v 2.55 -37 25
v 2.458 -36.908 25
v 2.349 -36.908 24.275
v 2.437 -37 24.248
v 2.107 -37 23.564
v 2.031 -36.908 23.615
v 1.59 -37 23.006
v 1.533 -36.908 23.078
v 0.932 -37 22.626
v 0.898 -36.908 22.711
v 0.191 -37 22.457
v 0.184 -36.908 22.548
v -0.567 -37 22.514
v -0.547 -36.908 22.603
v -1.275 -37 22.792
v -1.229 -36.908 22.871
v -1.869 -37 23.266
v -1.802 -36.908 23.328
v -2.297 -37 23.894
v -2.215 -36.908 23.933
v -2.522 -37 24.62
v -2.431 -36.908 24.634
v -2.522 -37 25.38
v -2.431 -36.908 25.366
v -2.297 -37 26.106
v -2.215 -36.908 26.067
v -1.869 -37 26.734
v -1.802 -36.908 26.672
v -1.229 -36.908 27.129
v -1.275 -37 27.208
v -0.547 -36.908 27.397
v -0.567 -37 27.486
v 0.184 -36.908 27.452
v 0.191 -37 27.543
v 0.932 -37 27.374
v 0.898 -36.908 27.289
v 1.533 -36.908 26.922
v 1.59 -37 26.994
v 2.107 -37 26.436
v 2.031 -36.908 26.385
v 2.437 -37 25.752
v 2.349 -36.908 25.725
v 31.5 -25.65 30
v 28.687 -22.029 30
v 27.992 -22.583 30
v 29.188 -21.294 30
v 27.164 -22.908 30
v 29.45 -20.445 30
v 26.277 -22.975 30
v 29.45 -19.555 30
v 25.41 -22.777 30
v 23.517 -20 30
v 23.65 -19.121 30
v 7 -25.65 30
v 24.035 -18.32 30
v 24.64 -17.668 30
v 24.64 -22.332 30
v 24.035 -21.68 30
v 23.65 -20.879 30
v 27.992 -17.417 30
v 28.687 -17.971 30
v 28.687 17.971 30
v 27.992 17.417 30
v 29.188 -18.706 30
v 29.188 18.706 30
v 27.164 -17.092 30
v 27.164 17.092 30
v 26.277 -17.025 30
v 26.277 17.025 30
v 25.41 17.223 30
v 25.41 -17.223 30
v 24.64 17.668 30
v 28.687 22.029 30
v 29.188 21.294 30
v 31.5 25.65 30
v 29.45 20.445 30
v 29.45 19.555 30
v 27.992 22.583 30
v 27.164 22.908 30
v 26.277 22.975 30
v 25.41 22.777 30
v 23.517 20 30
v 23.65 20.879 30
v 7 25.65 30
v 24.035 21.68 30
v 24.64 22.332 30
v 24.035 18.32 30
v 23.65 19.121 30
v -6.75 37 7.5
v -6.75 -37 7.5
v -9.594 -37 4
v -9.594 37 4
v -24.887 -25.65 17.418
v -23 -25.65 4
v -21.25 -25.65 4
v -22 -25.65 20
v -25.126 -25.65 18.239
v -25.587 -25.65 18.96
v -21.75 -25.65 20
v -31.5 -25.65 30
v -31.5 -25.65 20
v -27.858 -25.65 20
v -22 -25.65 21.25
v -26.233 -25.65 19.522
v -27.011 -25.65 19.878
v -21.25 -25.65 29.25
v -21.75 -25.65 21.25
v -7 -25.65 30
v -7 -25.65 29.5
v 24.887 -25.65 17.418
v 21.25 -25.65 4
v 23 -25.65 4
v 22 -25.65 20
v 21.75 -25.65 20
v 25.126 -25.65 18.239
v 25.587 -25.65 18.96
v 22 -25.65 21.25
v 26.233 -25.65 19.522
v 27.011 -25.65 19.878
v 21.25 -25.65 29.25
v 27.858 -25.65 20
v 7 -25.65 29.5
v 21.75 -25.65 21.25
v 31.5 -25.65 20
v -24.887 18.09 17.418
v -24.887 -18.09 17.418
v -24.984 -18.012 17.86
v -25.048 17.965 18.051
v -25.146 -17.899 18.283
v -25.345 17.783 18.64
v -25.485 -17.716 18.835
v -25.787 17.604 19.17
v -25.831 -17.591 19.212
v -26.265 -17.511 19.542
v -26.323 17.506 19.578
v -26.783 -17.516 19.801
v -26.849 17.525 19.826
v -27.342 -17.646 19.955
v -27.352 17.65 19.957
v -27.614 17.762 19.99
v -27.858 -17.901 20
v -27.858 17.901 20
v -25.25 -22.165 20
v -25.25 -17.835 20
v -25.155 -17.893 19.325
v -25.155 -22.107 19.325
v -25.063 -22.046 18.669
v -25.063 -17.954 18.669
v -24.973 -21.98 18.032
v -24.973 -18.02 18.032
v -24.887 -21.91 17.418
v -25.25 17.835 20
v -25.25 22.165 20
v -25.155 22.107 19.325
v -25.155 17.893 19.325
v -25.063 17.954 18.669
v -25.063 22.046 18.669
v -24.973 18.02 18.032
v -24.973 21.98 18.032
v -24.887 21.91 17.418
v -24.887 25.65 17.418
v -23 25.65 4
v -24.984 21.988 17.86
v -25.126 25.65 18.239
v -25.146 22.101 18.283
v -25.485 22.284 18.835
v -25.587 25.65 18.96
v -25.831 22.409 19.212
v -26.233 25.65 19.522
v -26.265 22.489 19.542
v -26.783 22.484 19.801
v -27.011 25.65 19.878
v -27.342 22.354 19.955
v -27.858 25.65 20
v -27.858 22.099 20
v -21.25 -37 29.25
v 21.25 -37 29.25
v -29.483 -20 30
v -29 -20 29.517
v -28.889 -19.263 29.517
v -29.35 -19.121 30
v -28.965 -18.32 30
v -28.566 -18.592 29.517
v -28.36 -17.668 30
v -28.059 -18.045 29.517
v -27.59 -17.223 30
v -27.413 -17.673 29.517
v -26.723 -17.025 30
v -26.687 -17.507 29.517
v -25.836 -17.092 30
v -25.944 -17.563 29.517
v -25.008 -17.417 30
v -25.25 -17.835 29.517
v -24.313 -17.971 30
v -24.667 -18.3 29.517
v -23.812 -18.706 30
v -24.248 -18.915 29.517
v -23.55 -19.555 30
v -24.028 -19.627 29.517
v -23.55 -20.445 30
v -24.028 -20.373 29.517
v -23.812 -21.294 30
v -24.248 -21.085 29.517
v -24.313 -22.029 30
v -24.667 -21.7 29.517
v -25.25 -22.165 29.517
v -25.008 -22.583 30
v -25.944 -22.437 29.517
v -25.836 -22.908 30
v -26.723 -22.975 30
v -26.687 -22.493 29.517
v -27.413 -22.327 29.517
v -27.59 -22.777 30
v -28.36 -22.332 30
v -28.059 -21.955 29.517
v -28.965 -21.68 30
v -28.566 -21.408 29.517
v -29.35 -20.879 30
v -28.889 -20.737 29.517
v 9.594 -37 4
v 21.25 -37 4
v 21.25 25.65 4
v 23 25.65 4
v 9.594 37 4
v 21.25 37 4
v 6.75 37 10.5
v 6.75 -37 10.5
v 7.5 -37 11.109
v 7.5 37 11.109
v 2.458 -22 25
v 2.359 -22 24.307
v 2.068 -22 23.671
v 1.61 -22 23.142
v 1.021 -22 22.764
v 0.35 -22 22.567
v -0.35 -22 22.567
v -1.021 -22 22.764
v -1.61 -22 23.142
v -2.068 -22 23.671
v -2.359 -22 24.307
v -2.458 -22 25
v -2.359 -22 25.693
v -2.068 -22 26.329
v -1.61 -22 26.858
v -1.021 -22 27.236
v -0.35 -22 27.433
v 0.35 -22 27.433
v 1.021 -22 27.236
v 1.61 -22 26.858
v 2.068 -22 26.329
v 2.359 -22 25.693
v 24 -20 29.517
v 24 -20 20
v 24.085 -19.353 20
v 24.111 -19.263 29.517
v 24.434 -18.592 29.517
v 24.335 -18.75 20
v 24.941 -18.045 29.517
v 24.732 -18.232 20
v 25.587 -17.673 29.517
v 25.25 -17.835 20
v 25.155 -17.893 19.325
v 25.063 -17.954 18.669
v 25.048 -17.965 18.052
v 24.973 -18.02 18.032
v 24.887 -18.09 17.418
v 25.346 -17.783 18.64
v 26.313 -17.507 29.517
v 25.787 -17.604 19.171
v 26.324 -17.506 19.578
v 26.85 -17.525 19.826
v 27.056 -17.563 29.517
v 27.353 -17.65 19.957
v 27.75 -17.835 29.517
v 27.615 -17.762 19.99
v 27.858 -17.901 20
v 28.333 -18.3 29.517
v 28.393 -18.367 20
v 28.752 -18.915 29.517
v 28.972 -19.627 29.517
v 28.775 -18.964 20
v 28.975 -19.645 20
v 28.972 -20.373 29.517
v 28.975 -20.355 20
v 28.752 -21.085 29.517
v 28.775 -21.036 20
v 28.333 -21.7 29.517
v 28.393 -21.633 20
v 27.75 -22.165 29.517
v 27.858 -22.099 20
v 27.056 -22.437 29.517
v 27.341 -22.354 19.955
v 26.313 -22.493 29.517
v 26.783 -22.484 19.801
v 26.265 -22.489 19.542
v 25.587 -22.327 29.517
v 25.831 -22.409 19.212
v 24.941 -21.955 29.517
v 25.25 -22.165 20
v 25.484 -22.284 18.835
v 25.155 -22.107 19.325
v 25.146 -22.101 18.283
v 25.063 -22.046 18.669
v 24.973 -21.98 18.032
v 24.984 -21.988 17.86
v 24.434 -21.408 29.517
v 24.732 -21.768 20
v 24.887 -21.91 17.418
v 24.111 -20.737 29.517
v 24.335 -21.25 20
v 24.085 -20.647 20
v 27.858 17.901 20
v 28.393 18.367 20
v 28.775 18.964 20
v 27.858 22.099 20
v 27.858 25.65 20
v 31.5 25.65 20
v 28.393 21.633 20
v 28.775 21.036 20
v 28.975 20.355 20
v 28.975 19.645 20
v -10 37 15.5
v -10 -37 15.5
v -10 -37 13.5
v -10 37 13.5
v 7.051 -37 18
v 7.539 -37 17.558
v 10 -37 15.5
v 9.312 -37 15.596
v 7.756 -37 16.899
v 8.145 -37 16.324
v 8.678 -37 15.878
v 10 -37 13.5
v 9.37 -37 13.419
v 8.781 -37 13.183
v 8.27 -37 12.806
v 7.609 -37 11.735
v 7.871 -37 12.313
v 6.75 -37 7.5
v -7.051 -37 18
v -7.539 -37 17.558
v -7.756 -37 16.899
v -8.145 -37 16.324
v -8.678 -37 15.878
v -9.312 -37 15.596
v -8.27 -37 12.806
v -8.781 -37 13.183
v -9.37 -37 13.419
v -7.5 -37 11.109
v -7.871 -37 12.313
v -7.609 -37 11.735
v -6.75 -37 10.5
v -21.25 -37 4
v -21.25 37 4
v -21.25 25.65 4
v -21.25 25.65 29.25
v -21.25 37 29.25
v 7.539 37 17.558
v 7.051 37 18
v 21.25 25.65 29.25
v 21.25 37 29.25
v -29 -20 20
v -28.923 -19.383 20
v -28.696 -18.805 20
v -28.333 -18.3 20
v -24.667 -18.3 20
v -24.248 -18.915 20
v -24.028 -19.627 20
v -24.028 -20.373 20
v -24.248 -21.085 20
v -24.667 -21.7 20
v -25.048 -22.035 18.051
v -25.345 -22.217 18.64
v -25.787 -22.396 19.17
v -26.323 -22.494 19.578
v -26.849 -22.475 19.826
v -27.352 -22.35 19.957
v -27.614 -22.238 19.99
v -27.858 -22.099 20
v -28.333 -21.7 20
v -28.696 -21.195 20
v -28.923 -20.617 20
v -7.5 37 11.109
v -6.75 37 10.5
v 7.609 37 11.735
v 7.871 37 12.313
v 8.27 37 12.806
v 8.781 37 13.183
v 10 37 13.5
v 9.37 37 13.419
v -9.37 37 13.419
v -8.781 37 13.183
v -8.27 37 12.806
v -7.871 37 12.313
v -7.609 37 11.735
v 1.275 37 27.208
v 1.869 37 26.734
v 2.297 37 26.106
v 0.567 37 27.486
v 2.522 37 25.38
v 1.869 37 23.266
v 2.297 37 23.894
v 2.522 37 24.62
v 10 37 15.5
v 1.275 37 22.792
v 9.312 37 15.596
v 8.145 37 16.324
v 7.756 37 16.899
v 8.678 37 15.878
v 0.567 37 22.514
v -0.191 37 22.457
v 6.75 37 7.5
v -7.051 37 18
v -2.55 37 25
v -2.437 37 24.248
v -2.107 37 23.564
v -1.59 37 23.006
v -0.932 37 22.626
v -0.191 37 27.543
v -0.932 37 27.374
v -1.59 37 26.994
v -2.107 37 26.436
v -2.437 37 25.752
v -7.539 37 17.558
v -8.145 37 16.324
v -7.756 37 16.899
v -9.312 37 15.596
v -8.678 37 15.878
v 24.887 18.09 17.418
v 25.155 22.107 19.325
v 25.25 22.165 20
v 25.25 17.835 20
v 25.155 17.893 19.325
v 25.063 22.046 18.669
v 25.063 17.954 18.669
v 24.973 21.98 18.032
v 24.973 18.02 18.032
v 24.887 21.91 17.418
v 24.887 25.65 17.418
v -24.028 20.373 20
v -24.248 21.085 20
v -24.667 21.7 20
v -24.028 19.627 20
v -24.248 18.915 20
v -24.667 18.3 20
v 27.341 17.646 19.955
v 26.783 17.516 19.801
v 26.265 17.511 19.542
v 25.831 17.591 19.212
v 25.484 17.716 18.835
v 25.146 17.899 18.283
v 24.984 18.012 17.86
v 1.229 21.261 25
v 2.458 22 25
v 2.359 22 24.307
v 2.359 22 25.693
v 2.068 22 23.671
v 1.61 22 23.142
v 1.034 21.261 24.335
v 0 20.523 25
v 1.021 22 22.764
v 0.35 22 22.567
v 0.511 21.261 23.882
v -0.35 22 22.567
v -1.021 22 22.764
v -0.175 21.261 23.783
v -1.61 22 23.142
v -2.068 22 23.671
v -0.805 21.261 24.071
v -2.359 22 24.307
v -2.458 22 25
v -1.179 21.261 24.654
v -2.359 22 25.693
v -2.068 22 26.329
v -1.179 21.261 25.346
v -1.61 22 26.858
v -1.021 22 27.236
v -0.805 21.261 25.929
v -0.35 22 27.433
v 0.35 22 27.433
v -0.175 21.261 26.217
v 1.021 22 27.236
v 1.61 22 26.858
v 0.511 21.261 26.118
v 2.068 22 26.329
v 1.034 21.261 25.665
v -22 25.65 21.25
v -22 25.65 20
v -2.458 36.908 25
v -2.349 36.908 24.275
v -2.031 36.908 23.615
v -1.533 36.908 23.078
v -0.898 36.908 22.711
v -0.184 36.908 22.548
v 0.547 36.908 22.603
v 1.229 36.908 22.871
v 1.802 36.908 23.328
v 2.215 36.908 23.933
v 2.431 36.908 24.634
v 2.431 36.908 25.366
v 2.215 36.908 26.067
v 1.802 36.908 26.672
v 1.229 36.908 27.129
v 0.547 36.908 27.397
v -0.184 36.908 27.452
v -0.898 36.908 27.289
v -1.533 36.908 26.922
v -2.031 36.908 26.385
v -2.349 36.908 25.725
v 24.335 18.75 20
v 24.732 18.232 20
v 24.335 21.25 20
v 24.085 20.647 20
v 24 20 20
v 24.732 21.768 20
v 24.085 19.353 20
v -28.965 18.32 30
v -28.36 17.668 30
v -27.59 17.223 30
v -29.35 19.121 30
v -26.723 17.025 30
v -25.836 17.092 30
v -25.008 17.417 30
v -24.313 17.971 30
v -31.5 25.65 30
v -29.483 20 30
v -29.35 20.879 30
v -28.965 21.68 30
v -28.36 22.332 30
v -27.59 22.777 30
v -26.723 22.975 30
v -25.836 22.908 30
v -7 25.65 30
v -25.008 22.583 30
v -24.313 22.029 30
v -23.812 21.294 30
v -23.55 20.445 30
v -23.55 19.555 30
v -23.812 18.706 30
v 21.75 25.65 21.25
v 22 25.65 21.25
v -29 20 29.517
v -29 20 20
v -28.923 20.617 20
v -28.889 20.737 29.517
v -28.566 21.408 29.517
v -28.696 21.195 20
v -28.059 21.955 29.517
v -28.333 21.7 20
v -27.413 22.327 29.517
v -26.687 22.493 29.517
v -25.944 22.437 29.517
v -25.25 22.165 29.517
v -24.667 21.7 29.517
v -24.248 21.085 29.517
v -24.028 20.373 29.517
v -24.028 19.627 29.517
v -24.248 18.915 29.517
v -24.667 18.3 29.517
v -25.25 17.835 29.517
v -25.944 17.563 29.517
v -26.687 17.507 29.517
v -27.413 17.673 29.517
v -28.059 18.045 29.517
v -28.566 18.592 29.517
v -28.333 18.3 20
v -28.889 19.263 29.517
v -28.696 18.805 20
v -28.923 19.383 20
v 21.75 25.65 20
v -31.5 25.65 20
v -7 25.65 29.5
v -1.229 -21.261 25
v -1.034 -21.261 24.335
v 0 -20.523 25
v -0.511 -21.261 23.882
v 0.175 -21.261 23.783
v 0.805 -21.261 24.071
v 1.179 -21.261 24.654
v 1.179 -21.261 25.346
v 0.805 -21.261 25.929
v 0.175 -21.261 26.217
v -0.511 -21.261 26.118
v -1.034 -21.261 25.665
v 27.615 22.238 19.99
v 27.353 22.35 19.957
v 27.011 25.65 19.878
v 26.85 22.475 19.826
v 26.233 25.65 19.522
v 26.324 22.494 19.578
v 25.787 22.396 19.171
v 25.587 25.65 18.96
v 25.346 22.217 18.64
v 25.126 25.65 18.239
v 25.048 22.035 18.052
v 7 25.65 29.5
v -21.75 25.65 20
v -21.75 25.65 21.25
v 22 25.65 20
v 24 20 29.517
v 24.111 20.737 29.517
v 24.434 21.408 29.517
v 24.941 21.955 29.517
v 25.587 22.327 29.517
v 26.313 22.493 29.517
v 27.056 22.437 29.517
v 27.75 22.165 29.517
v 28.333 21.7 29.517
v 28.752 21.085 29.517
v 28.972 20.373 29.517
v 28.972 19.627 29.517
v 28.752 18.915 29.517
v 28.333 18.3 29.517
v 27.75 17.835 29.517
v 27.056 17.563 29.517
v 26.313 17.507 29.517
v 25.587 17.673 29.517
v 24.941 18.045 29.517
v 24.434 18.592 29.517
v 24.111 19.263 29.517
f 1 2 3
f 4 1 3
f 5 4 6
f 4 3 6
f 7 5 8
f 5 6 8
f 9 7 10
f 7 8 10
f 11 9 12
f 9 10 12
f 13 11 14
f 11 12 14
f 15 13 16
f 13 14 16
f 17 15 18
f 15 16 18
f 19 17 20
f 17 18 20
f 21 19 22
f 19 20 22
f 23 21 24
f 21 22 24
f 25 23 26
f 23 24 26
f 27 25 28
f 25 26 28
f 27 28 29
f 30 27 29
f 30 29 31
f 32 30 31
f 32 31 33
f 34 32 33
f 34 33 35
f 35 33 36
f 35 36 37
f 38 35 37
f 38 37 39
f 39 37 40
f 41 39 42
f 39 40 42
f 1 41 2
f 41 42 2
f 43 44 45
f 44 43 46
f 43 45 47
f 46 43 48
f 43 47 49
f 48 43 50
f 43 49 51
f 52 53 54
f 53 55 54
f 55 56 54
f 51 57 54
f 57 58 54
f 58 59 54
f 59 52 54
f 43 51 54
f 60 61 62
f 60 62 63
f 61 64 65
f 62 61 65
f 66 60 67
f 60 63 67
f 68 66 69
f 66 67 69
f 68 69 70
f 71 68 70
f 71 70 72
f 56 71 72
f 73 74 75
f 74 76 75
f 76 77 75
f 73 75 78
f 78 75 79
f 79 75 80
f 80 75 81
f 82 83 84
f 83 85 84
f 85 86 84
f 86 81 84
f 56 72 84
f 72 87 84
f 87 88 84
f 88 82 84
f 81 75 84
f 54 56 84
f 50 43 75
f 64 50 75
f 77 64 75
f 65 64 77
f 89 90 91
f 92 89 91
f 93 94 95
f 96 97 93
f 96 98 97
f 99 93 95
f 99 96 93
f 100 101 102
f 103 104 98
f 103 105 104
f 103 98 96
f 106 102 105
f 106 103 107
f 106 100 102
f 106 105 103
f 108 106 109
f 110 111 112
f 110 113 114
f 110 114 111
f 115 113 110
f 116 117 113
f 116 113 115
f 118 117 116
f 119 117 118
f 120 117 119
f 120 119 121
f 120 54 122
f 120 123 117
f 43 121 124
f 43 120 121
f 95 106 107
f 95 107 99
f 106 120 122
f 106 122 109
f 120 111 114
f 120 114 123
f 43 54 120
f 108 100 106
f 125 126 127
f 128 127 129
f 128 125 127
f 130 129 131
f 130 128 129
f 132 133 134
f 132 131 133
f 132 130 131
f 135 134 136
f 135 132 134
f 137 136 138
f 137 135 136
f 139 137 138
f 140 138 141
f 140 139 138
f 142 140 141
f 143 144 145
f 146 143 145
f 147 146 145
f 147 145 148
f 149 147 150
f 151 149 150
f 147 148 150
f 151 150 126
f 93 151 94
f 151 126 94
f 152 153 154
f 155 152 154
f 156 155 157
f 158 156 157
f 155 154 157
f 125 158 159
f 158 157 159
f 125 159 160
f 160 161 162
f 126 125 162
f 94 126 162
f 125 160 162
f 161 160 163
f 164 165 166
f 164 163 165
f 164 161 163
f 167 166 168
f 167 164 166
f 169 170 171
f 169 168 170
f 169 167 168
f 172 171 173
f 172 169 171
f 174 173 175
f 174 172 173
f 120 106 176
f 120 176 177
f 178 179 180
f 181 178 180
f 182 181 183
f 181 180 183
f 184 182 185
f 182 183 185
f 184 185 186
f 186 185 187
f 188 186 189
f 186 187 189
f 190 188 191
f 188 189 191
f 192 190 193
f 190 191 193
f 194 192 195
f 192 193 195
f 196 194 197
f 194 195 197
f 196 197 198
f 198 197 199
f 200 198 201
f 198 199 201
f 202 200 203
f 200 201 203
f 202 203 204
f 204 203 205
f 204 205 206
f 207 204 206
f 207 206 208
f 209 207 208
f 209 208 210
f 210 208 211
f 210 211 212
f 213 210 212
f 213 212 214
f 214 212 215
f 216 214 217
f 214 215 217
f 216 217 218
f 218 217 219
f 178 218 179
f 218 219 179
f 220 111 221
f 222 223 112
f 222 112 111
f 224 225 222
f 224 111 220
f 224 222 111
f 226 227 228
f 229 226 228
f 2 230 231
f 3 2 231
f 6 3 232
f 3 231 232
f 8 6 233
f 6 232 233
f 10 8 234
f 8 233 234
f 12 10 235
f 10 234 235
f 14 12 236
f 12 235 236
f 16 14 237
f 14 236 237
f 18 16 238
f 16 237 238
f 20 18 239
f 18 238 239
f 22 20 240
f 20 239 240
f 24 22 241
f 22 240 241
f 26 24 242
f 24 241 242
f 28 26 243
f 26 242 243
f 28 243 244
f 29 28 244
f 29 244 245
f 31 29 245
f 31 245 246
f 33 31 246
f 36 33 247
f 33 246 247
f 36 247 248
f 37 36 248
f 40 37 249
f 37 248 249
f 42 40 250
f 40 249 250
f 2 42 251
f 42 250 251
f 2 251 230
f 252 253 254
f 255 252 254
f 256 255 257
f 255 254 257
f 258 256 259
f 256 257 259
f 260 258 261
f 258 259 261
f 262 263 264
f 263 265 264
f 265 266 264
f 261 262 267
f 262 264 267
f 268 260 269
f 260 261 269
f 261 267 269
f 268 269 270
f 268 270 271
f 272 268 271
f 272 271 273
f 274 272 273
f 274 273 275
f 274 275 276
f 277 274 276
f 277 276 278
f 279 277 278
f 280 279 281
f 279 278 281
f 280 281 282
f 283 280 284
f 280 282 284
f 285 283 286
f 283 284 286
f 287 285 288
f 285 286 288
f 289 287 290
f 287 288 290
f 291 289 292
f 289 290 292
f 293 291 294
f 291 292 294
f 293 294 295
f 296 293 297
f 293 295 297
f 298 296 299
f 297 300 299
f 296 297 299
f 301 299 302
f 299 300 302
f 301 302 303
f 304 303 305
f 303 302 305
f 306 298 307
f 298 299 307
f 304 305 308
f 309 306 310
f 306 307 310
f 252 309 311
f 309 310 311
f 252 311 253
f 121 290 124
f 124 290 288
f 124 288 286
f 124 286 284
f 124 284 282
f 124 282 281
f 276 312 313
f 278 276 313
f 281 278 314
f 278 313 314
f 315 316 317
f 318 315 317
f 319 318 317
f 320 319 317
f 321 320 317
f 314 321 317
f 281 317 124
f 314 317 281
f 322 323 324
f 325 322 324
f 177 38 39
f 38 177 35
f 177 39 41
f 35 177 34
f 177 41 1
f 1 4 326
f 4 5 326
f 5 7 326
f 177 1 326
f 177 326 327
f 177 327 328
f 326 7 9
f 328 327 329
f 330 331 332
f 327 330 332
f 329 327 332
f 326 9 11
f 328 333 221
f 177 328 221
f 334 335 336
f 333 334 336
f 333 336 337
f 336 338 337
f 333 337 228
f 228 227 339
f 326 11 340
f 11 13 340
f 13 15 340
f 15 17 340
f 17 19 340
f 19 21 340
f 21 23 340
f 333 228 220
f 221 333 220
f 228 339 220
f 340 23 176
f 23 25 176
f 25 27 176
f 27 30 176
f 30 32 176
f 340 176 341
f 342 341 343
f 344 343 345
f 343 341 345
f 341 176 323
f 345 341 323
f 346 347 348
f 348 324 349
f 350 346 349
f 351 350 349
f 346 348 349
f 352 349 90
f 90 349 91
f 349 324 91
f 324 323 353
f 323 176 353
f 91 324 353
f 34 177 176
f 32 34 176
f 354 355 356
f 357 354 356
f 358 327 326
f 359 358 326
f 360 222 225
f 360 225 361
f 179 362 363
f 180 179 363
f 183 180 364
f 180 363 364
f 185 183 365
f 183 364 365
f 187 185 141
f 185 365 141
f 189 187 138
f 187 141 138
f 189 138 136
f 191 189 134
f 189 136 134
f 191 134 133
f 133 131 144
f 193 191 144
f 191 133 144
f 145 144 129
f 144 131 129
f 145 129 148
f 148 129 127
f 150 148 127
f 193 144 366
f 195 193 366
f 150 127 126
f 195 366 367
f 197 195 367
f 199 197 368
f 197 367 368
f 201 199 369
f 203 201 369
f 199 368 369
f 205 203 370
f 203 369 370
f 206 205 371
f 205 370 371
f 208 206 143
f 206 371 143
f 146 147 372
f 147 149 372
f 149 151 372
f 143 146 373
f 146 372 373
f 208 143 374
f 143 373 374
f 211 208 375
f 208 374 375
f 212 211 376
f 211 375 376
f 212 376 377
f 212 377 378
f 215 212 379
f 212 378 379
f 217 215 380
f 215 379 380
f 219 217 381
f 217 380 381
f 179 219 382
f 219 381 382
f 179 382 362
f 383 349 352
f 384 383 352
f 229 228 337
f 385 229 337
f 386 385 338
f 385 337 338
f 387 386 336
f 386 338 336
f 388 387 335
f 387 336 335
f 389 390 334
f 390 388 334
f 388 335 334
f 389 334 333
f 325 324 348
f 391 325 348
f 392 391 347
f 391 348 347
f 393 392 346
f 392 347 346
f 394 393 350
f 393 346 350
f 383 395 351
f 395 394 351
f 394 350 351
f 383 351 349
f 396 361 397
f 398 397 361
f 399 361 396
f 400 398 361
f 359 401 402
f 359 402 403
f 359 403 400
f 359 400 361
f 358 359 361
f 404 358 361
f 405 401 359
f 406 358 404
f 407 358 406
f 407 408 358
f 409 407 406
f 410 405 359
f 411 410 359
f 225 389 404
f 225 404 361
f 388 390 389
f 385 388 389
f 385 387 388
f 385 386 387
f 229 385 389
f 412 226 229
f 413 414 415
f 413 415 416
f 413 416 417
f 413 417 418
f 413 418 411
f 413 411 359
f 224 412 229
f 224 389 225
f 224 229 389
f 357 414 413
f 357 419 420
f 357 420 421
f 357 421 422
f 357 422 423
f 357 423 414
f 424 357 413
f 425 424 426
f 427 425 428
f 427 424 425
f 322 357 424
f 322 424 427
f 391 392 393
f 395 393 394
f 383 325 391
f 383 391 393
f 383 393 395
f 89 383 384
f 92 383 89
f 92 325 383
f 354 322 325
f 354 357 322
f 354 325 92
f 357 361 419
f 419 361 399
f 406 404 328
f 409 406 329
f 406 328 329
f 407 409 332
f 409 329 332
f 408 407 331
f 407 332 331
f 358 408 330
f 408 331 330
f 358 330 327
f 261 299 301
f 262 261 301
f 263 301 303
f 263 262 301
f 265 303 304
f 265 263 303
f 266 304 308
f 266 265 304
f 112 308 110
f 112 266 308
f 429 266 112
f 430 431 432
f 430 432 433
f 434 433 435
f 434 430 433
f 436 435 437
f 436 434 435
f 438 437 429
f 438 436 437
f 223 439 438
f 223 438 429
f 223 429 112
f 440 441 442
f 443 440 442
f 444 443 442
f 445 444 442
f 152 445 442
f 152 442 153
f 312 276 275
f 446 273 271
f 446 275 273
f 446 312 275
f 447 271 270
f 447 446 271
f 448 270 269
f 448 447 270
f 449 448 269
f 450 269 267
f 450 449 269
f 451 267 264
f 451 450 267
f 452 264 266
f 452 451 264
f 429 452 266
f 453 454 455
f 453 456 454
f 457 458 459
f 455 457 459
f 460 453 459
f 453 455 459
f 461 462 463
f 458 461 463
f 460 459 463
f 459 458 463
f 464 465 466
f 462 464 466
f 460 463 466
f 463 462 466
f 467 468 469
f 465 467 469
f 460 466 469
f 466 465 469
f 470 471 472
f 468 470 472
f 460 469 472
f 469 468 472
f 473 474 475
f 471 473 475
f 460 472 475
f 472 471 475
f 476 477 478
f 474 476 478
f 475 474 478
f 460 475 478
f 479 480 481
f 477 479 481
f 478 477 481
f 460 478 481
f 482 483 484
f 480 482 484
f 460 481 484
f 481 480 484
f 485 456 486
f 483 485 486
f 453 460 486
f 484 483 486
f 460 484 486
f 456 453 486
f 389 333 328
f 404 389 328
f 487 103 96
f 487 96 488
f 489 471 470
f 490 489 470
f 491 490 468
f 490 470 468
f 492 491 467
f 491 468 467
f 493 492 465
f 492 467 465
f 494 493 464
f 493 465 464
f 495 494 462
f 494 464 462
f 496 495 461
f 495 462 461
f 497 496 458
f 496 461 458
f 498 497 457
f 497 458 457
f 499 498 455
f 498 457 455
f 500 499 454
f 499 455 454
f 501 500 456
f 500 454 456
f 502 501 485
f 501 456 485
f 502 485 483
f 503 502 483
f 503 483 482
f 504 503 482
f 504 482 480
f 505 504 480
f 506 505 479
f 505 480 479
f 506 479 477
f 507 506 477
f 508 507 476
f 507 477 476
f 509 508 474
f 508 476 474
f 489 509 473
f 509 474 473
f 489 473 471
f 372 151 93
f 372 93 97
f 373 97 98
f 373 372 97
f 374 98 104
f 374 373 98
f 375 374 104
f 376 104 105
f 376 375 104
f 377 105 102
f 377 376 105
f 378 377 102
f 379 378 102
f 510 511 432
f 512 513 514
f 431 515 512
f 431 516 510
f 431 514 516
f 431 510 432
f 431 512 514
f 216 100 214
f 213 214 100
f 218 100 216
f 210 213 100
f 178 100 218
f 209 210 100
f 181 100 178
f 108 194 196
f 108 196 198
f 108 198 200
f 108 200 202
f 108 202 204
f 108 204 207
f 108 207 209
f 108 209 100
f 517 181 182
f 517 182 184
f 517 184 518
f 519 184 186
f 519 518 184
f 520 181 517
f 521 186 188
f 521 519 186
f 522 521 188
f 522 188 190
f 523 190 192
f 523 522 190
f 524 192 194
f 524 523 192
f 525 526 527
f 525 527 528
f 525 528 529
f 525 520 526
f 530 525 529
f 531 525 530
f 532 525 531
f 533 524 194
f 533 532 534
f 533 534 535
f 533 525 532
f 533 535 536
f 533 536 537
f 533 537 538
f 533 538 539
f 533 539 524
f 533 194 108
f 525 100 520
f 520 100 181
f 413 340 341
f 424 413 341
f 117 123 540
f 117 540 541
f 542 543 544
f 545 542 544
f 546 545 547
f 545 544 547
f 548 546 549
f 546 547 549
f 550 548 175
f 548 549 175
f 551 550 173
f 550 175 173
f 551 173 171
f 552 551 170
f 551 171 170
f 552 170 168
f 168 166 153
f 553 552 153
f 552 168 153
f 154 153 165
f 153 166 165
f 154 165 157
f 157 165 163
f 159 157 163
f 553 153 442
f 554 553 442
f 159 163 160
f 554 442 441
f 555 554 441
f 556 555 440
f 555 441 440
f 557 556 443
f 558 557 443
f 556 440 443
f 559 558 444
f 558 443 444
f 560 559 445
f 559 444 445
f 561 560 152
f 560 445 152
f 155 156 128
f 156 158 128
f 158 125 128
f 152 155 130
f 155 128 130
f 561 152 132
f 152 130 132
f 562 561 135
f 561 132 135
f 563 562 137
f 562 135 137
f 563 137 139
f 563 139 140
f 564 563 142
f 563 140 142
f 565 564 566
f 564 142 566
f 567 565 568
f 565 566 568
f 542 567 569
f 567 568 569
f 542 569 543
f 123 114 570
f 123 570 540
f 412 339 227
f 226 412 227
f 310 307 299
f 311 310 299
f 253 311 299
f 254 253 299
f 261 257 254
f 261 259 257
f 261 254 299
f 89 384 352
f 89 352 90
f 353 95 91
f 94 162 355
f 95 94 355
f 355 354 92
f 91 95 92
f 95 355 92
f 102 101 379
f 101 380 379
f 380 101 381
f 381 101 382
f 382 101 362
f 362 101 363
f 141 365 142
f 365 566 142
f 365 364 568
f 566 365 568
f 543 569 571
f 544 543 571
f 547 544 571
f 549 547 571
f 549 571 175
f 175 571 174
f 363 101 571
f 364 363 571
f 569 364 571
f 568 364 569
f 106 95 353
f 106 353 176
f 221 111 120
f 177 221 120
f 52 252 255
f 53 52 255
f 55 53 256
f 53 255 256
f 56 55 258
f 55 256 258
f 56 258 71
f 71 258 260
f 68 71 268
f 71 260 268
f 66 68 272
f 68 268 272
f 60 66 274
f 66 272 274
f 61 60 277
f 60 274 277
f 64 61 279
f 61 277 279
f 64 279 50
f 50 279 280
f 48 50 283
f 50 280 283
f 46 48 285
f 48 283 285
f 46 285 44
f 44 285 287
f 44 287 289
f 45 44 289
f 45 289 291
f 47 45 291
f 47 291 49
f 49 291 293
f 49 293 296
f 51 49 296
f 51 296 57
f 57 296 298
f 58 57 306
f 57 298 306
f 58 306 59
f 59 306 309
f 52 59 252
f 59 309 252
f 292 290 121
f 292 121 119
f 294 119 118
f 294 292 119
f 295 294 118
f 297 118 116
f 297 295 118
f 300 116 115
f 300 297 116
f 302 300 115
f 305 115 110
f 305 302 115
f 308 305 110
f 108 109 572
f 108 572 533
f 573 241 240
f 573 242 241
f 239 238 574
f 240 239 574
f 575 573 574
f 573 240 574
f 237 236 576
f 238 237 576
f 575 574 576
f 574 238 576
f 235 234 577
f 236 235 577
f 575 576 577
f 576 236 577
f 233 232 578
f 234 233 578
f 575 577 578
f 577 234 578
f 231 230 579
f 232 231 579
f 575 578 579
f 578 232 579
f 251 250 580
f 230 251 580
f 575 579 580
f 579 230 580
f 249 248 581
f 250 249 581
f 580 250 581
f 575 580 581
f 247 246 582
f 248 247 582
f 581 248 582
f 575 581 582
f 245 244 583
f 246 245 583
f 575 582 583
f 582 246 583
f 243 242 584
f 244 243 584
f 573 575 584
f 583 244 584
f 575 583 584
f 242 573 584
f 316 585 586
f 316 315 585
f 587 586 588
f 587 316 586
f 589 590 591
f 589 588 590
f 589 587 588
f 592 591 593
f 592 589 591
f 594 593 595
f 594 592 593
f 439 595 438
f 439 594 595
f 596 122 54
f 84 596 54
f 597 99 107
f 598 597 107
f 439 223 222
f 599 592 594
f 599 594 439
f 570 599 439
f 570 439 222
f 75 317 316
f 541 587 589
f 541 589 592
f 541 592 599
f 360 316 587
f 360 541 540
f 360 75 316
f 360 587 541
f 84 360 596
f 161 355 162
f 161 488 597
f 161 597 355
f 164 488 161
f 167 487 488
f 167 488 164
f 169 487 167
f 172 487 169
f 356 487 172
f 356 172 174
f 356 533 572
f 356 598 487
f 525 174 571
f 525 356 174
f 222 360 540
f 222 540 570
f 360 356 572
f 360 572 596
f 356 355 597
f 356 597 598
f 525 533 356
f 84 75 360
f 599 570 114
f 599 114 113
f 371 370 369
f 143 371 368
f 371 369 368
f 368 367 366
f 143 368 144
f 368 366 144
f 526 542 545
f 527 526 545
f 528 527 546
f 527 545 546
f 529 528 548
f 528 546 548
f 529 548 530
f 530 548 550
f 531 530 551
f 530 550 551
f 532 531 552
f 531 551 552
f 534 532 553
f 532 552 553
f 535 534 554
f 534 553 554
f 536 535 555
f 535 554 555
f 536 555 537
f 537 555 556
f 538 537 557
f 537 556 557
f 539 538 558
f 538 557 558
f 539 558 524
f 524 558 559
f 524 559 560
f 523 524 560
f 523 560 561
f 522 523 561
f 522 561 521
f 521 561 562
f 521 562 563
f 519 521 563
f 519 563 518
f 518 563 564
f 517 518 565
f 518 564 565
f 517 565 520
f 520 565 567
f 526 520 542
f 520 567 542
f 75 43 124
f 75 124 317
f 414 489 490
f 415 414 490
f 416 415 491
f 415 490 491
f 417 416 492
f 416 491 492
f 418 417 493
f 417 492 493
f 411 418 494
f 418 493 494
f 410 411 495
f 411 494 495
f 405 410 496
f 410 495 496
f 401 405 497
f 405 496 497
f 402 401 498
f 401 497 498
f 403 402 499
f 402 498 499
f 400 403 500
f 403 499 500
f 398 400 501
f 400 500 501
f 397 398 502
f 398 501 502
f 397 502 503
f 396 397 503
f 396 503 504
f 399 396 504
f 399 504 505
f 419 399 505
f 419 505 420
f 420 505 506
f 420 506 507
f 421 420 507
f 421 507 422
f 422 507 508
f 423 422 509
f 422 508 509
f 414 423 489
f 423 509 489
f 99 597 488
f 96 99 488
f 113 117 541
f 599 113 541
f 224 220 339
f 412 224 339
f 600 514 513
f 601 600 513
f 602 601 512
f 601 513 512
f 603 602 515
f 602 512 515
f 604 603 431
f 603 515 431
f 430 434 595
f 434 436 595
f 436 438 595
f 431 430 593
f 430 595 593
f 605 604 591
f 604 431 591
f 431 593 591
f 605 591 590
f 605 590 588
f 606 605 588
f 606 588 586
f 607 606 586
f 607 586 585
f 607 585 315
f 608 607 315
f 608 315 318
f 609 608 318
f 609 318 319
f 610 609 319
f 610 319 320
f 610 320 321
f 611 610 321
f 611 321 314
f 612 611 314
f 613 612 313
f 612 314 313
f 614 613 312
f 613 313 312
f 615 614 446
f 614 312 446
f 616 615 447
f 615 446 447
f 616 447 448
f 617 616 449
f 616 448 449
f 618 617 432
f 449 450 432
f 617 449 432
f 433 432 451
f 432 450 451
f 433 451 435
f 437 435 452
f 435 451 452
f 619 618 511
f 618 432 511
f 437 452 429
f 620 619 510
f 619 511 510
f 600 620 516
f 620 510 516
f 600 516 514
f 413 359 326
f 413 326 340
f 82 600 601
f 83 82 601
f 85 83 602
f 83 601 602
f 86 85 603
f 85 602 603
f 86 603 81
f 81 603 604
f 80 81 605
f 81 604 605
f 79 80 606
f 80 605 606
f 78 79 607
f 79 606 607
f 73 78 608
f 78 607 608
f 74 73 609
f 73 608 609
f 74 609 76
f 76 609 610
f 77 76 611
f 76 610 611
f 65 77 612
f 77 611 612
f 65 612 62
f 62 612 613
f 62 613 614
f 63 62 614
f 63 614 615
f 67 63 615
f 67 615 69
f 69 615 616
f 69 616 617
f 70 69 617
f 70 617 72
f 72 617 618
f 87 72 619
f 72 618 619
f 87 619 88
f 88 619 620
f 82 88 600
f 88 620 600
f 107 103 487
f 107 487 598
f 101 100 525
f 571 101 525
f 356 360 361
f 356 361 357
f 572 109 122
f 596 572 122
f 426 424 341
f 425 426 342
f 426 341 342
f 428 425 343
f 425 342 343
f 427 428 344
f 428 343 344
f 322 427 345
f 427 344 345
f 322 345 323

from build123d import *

# Parameters (mm, degrees)
SKIZZE1_W                       = 44
SKIZZE1_H                       = 51.3
AUFSATZ_LINEAR_AUSTRAGEN1_DEPTH = 26
SKIZZE2_W                       = 0.25
SKIZZE2_H                       = 17.25
SCHNITT_LINEAR_AUSTRAGEN1_DEPTH = 64.369472146
SKIZZE3_W                       = 14
SKIZZE3_H                       = 0.5
SCHNITT_LINEAR_AUSTRAGEN2_DEPTH = 64.369472146
SKIZZE4_W                       = 0.25
SKIZZE4_H                       = 17.25
SCHNITT_LINEAR_AUSTRAGEN3_DEPTH = 51.3
SKIZZE5_W                       = 42.5
SKIZZE5_H                       = 25.25
AUFSATZ_LINEAR_AUSTRAGEN2_DEPTH = 11.35
SKIZZE6_W                       = 42.5
SKIZZE6_H                       = 25.25
AUFSATZ_LINEAR_AUSTRAGEN3_DEPTH = 11.35
SKIZZE15_W                      = 9.5
SKIZZE15_H                      = 51.3
AUFSATZ_LINEAR_AUSTRAGEN5_DEPTH = 10
SCHNITT_LINEAR_AUSTRAGEN4_DEPTH = 86.838511171
BOHRUNG1_D                      = 4.917
BOHRUNG1_DEPTH                  = 15
BOHRUNG1_TIP                    = 1.477215832
BOHRUNG2_D                      = 4.917
BOHRUNG2_DEPTH                  = 15
BOHRUNG2_TIP                    = 1.477215832
M6_GEWINDEBOHRUNG1_D            = 5
M6_GEWINDEBOHRUNG1_DEPTH        = 17
M6_GEWINDEBOHRUNG1_TIP          = 1.502151548
FASE1_SIZE                      = 0.483
FASE2_SIZE                      = 0.448979592
FASE3_SIZE                      = 0.0915
FASE4_SIZE                      = 0.448979592
AUFSATZ_LINEAR_START            = -51.3
AUFSATZ_LINEAR_AUSTRAGEN6_DEPTH = 51.3
VERRUNDUNG1_R                   = 3


with BuildPart() as part:
    # Skizze1 → Aufsatz-Linear austragen1 (new body)
    with BuildSketch(Plane(origin=(0, 0, 4), x_dir=(-1, 0, 0), z_dir=(0, 0, -1))):
        Rectangle(SKIZZE1_W, SKIZZE1_H)
    extrude(amount=-AUFSATZ_LINEAR_AUSTRAGEN1_DEPTH)

    # Skizze2 → Schnitt-Linear austragen1 (cut, through all)
    with BuildSketch(Plane.XZ.offset(25.65)):
        with Locations((-21.875, 12.625)):
            Rectangle(SKIZZE2_W, SKIZZE2_H)
    extrude(amount=-SCHNITT_LINEAR_AUSTRAGEN1_DEPTH, mode=Mode.SUBTRACT)

    # Skizze3 → Schnitt-Linear austragen2 (cut, through all)
    with BuildSketch(Plane.XZ.offset(25.65)):
        with Locations((0, 29.75)):
            Rectangle(SKIZZE3_W, SKIZZE3_H)
    extrude(amount=-SCHNITT_LINEAR_AUSTRAGEN2_DEPTH, mode=Mode.SUBTRACT)

    # Skizze4 → Schnitt-Linear austragen3 (cut)
    with BuildSketch(Plane.XZ.offset(25.65)):
        with Locations((21.875, 12.625)):
            Rectangle(SKIZZE4_W, SKIZZE4_H)
    extrude(amount=-SCHNITT_LINEAR_AUSTRAGEN3_DEPTH, mode=Mode.SUBTRACT)

    # Skizze5 → Aufsatz-Linear austragen2 (add)
    with BuildSketch(Plane(origin=(0, 25.65, 0), x_dir=(-1, 0, 0), z_dir=(0, 1, 0))):
        with Locations((0, 16.625)):
            Rectangle(SKIZZE5_W, SKIZZE5_H)
    extrude(amount=AUFSATZ_LINEAR_AUSTRAGEN2_DEPTH)

    # Skizze6 → Aufsatz-Linear austragen3 (add)
    with BuildSketch(Plane.XZ.offset(25.65)):
        with Locations((0, 16.625)):
            Rectangle(SKIZZE6_W, SKIZZE6_H)
    extrude(amount=AUFSATZ_LINEAR_AUSTRAGEN3_DEPTH)

    # Skizze15 → Aufsatz-Linear austragen5 (add)
    with BuildSketch(Plane.XY.offset(30)):
        with Locations((-26.75, 0)):
            Rectangle(SKIZZE15_W, SKIZZE15_H)
        with Locations((26.75, 0)):
            Rectangle(SKIZZE15_W, SKIZZE15_H)
    extrude(amount=-AUFSATZ_LINEAR_AUSTRAGEN5_DEPTH)

    # Skizze7 → Schnitt-Linear austragen4 (cut, through all)
    with BuildSketch(Plane.XZ.offset(37)):
        with BuildLine():
            Line((-9.59375, 4), (9.59375, 4))
            Line((9.59375, 4), (6.75, 7.5))
            Line((6.75, 7.5), (6.75, 10.5))
            Line((6.75, 10.5), (7.5, 11.109375))
            ThreePointArc((7.5, 11.109375), (8.270470592, 12.806156162), (10, 13.5))
            Line((10, 13.5), (10, 15.5))
            ThreePointArc((10, 15.5), (8.232233047, 16.232233047), (7.5, 18))
            Line((7.5, 18), (-7.5, 18))
            ThreePointArc((-7.5, 18), (-8.232233047, 16.232233047), (-10, 15.5))
            Line((-10, 15.5), (-10, 13.5))
            ThreePointArc((-10, 13.5), (-8.270470592, 12.806156162), (-7.5, 11.109375))
            Line((-7.5, 11.109375), (-6.75, 10.5))
            Line((-6.75, 10.5), (-6.75, 7.5))
            Line((-6.75, 7.5), (-9.59375, 4))
        make_face()
    extrude(amount=-SCHNITT_LINEAR_AUSTRAGEN4_DEPTH, mode=Mode.SUBTRACT)

    # Bohrung1
    with Locations(Plane(origin=(0, -37, 0), x_dir=(-1, 0, 0), z_dir=(0, -1, 0))):
        with Locations((0, -25)):
            Hole(BOHRUNG1_D / 2, depth=BOHRUNG1_DEPTH)
            with Locations((0, 0, -(BOHRUNG1_DEPTH + BOHRUNG1_TIP / 2))):  # 118° drill point
                Cone(0, BOHRUNG1_D / 2, BOHRUNG1_TIP, mode=Mode.SUBTRACT)

    # Bohrung2
    with Locations(Plane(origin=(0, 37, 0), x_dir=(1, 0, 0), z_dir=(0, 1, 0))):
        with Locations((0, -25)):
            Hole(BOHRUNG2_D / 2, depth=BOHRUNG2_DEPTH)
            with Locations((0, 0, -(BOHRUNG2_DEPTH + BOHRUNG2_TIP / 2))):  # 118° drill point
                Cone(0, BOHRUNG2_D / 2, BOHRUNG2_TIP, mode=Mode.SUBTRACT)

    # M6 Gewindebohrung1
    with Locations(Plane.XY.offset(30)):
        with Locations((26.5, -20), (26.5, 20), (-26.5, 20), (-26.5, -20)):
            Hole(M6_GEWINDEBOHRUNG1_D / 2, depth=M6_GEWINDEBOHRUNG1_DEPTH)
            with Locations((0, 0, -(M6_GEWINDEBOHRUNG1_DEPTH + M6_GEWINDEBOHRUNG1_TIP / 2))):  # 118° drill point
                Cone(0, M6_GEWINDEBOHRUNG1_D / 2, M6_GEWINDEBOHRUNG1_TIP, mode=Mode.SUBTRACT)

    # Fase1
    fase1_edges = [part.edges().sort_by_distance(p)[0] for p in [
        (-24, -20, 30),
        (-24, 20, 30),
        (29, 20, 30),
        (29, -20, 30),
    ]]
    chamfer(fase1_edges, length=FASE1_SIZE)

    # Fase2
    # the kernel refuses this chamfer: 0.448979592, 0.406117321 mm, written as the material it adds along each edge
    with BuildSketch(Plane(origin=(-7.5, -37, 18), x_dir=(1, 0, 0), z_dir=(0, 1, 0))) as fase2_piece_1:
        with BuildLine():
            Line((FASE2_SIZE, 0), (-0.03932739, 0.441690284))
            ThreePointArc((-0.03932739, 0.441690284), (-0.010448273, 0.22832477), (0, 0))
            Line((0, 0), (FASE2_SIZE, 0))
        make_face()
    extrude(amount=74)

    # Fase3
    fase3_edges = [part.edges().sort_by_distance(p)[0] for p in [
        (-2.4585, -37, 25),
        (2.4585, 37, 25),
    ]]
    chamfer(fase3_edges, length=FASE3_SIZE)

    # Fase4
    # the kernel refuses this chamfer: 0.448979592, 0.406117321 mm, written as the material it adds along each edge
    with BuildSketch(Plane(origin=(7.5, -37, 18), x_dir=(0.08868753028202897, 0, -0.9960594972050988), z_dir=(0, 1, 0))) as fase4_piece_1:
        with BuildLine():
            Line((0.443437651, 0), (-FASE4_SIZE * 0.0886875302498, FASE4_SIZE * 0.996059496843))
            Line((-FASE4_SIZE * 0.0886875302498, FASE4_SIZE * 0.996059496843), (0, 0))
            ThreePointArc((0, 0), (0.228351687, 0.009842458), (0.443437651, 0))
        make_face()
    extrude(amount=74)

    # Skizze16 → Aufsatz-Linear austragen6 (add)
    with BuildSketch(Plane.XZ.offset(25.65).offset(AUFSATZ_LINEAR_START)):
        Polygon((-21.75, 4), (-21.75, 20), (-25.25, 20), (-23, 4), align=None)
        Polygon((21.75, 20), (25.25, 20), (23, 4), (21.75, 4), align=None)
    extrude(amount=AUFSATZ_LINEAR_AUSTRAGEN6_DEPTH)

    # Verrundung1
    # the kernel refuses this fillet: 3 mm, written as the material it adds along each edge
    with BuildSketch(Plane(origin=(-25.25, 25.65, 20), x_dir=(0.13925483139909986, 0, -0.9902565788380344), z_dir=(0, -1, 0))) as verrundung1_piece_1_section:
        with BuildLine():
            CenterArc((VERRUNDUNG1_R * 0.869214289504, -VERRUNDUNG1_R), VERRUNDUNG1_R, 90, 81.995271143)
            Line((-VERRUNDUNG1_R * 0.121042289335, -VERRUNDUNG1_R * 0.860745168601), (0, 0))
            Line((0, 0), (VERRUNDUNG1_R * 0.869214289504, 0))
        make_face()
    verrundung1_piece_1 = extrude(amount=10.004043662, mode=Mode.PRIVATE)
    verrundung1_piece_1 = verrundung1_piece_1 - Plane(origin=(-26.5, 20, 20), x_dir=(-1, 0, 0), z_dir=(0, 0, -1)) * Cylinder(2.5, 31, mode=Mode.PRIVATE)
    add(verrundung1_piece_1)
    with BuildSketch(Plane(origin=(-25.25, 24.354043662, 20), x_dir=(0.13925483139909986, 0, -0.9902565788380344), z_dir=(0, -1, 0))) as verrundung1_piece_2_section:
        with BuildLine():
            CenterArc((VERRUNDUNG1_R * 0.869214289504, -VERRUNDUNG1_R), VERRUNDUNG1_R, 90, 81.995271143)
            Line((-VERRUNDUNG1_R * 0.121042289335, -VERRUNDUNG1_R * 0.860745168601), (0, 0))
            Line((0, 0), (VERRUNDUNG1_R * 0.869214289504, 0))
        make_face()
    verrundung1_piece_2 = extrude(amount=48.708087324, mode=Mode.PRIVATE)
    verrundung1_piece_2 = verrundung1_piece_2 - Plane(origin=(-26.5, -20, 20), x_dir=(-1, 0, 0), z_dir=(0, 0, -1)) * Cylinder(2.5, 108, mode=Mode.PRIVATE)
    verrundung1_piece_2 = verrundung1_piece_2 - Plane(origin=(-26.5, 20, 20), x_dir=(-1, 0, 0), z_dir=(0, 0, -1)) * Cylinder(2.5, 108, mode=Mode.PRIVATE)
    add(verrundung1_piece_2)
    with BuildSketch(Plane(origin=(-25.25, -15.645956338, 20), x_dir=(0.13925483139909986, 0, -0.9902565788380344), z_dir=(0, -1, 0))) as verrundung1_piece_3_section:
        with BuildLine():
            CenterArc((VERRUNDUNG1_R * 0.869214289504, -VERRUNDUNG1_R), VERRUNDUNG1_R, 90, 81.995271143)
            Line((-VERRUNDUNG1_R * 0.121042289335, -VERRUNDUNG1_R * 0.860745168601), (0, 0))
            Line((0, 0), (VERRUNDUNG1_R * 0.869214289504, 0))
        make_face()
    verrundung1_piece_3 = extrude(amount=10.004043662, mode=Mode.PRIVATE)
    verrundung1_piece_3 = verrundung1_piece_3 - Plane(origin=(-26.5, -20, 20), x_dir=(-1, 0, 0), z_dir=(0, 0, -1)) * Cylinder(2.5, 31, mode=Mode.PRIVATE)
    add(verrundung1_piece_3)
    with BuildSketch(Plane(origin=(25.25, 25.65, 20), x_dir=(1, 0, 0), z_dir=(0, -1, 0))) as verrundung1_piece_4_section:
        with BuildLine():
            CenterArc((VERRUNDUNG1_R * 0.869214289504, -VERRUNDUNG1_R), VERRUNDUNG1_R, 90, 81.995271143)
            Line((-VERRUNDUNG1_R * 0.121042289335, -VERRUNDUNG1_R * 0.860745168601), (0, 0))
            Line((0, 0), (VERRUNDUNG1_R * 0.869214289504, 0))
        make_face()
    verrundung1_piece_4 = extrude(amount=10.004043662, mode=Mode.PRIVATE)
    verrundung1_piece_4 = verrundung1_piece_4 - Plane(origin=(26.5, 20, 20), x_dir=(-1, 0, 0), z_dir=(0, 0, -1)) * Cylinder(2.5, 31, mode=Mode.PRIVATE)
    add(verrundung1_piece_4)
    with BuildSketch(Plane(origin=(25.25, 24.354043662, 20), x_dir=(1, 0, 0), z_dir=(0, -1, 0))) as verrundung1_piece_5_section:
        with BuildLine():
            CenterArc((VERRUNDUNG1_R * 0.869214289504, -VERRUNDUNG1_R), VERRUNDUNG1_R, 90, 81.995271143)
            Line((-VERRUNDUNG1_R * 0.121042289335, -VERRUNDUNG1_R * 0.860745168601), (0, 0))
            Line((0, 0), (VERRUNDUNG1_R * 0.869214289504, 0))
        make_face()
    verrundung1_piece_5 = extrude(amount=48.708087324, mode=Mode.PRIVATE)
    verrundung1_piece_5 = verrundung1_piece_5 - Plane(origin=(26.5, -20, 20), x_dir=(-1, 0, 0), z_dir=(0, 0, -1)) * Cylinder(2.5, 108, mode=Mode.PRIVATE)
    verrundung1_piece_5 = verrundung1_piece_5 - Plane(origin=(26.5, 20, 20), x_dir=(-1, 0, 0), z_dir=(0, 0, -1)) * Cylinder(2.5, 108, mode=Mode.PRIVATE)
    add(verrundung1_piece_5)
    with BuildSketch(Plane(origin=(25.25, -15.645956338, 20), x_dir=(1, 0, 0), z_dir=(0, -1, 0))) as verrundung1_piece_6_section:
        with BuildLine():
            CenterArc((VERRUNDUNG1_R * 0.869214289504, -VERRUNDUNG1_R), VERRUNDUNG1_R, 90, 81.995271143)
            Line((-VERRUNDUNG1_R * 0.121042289335, -VERRUNDUNG1_R * 0.860745168601), (0, 0))
            Line((0, 0), (VERRUNDUNG1_R * 0.869214289504, 0))
        make_face()
    verrundung1_piece_6 = extrude(amount=10.004043662, mode=Mode.PRIVATE)
    verrundung1_piece_6 = verrundung1_piece_6 - Plane(origin=(26.5, -20, 20), x_dir=(-1, 0, 0), z_dir=(0, 0, -1)) * Cylinder(2.5, 31, mode=Mode.PRIVATE)
    add(verrundung1_piece_6)


solid = part.part
